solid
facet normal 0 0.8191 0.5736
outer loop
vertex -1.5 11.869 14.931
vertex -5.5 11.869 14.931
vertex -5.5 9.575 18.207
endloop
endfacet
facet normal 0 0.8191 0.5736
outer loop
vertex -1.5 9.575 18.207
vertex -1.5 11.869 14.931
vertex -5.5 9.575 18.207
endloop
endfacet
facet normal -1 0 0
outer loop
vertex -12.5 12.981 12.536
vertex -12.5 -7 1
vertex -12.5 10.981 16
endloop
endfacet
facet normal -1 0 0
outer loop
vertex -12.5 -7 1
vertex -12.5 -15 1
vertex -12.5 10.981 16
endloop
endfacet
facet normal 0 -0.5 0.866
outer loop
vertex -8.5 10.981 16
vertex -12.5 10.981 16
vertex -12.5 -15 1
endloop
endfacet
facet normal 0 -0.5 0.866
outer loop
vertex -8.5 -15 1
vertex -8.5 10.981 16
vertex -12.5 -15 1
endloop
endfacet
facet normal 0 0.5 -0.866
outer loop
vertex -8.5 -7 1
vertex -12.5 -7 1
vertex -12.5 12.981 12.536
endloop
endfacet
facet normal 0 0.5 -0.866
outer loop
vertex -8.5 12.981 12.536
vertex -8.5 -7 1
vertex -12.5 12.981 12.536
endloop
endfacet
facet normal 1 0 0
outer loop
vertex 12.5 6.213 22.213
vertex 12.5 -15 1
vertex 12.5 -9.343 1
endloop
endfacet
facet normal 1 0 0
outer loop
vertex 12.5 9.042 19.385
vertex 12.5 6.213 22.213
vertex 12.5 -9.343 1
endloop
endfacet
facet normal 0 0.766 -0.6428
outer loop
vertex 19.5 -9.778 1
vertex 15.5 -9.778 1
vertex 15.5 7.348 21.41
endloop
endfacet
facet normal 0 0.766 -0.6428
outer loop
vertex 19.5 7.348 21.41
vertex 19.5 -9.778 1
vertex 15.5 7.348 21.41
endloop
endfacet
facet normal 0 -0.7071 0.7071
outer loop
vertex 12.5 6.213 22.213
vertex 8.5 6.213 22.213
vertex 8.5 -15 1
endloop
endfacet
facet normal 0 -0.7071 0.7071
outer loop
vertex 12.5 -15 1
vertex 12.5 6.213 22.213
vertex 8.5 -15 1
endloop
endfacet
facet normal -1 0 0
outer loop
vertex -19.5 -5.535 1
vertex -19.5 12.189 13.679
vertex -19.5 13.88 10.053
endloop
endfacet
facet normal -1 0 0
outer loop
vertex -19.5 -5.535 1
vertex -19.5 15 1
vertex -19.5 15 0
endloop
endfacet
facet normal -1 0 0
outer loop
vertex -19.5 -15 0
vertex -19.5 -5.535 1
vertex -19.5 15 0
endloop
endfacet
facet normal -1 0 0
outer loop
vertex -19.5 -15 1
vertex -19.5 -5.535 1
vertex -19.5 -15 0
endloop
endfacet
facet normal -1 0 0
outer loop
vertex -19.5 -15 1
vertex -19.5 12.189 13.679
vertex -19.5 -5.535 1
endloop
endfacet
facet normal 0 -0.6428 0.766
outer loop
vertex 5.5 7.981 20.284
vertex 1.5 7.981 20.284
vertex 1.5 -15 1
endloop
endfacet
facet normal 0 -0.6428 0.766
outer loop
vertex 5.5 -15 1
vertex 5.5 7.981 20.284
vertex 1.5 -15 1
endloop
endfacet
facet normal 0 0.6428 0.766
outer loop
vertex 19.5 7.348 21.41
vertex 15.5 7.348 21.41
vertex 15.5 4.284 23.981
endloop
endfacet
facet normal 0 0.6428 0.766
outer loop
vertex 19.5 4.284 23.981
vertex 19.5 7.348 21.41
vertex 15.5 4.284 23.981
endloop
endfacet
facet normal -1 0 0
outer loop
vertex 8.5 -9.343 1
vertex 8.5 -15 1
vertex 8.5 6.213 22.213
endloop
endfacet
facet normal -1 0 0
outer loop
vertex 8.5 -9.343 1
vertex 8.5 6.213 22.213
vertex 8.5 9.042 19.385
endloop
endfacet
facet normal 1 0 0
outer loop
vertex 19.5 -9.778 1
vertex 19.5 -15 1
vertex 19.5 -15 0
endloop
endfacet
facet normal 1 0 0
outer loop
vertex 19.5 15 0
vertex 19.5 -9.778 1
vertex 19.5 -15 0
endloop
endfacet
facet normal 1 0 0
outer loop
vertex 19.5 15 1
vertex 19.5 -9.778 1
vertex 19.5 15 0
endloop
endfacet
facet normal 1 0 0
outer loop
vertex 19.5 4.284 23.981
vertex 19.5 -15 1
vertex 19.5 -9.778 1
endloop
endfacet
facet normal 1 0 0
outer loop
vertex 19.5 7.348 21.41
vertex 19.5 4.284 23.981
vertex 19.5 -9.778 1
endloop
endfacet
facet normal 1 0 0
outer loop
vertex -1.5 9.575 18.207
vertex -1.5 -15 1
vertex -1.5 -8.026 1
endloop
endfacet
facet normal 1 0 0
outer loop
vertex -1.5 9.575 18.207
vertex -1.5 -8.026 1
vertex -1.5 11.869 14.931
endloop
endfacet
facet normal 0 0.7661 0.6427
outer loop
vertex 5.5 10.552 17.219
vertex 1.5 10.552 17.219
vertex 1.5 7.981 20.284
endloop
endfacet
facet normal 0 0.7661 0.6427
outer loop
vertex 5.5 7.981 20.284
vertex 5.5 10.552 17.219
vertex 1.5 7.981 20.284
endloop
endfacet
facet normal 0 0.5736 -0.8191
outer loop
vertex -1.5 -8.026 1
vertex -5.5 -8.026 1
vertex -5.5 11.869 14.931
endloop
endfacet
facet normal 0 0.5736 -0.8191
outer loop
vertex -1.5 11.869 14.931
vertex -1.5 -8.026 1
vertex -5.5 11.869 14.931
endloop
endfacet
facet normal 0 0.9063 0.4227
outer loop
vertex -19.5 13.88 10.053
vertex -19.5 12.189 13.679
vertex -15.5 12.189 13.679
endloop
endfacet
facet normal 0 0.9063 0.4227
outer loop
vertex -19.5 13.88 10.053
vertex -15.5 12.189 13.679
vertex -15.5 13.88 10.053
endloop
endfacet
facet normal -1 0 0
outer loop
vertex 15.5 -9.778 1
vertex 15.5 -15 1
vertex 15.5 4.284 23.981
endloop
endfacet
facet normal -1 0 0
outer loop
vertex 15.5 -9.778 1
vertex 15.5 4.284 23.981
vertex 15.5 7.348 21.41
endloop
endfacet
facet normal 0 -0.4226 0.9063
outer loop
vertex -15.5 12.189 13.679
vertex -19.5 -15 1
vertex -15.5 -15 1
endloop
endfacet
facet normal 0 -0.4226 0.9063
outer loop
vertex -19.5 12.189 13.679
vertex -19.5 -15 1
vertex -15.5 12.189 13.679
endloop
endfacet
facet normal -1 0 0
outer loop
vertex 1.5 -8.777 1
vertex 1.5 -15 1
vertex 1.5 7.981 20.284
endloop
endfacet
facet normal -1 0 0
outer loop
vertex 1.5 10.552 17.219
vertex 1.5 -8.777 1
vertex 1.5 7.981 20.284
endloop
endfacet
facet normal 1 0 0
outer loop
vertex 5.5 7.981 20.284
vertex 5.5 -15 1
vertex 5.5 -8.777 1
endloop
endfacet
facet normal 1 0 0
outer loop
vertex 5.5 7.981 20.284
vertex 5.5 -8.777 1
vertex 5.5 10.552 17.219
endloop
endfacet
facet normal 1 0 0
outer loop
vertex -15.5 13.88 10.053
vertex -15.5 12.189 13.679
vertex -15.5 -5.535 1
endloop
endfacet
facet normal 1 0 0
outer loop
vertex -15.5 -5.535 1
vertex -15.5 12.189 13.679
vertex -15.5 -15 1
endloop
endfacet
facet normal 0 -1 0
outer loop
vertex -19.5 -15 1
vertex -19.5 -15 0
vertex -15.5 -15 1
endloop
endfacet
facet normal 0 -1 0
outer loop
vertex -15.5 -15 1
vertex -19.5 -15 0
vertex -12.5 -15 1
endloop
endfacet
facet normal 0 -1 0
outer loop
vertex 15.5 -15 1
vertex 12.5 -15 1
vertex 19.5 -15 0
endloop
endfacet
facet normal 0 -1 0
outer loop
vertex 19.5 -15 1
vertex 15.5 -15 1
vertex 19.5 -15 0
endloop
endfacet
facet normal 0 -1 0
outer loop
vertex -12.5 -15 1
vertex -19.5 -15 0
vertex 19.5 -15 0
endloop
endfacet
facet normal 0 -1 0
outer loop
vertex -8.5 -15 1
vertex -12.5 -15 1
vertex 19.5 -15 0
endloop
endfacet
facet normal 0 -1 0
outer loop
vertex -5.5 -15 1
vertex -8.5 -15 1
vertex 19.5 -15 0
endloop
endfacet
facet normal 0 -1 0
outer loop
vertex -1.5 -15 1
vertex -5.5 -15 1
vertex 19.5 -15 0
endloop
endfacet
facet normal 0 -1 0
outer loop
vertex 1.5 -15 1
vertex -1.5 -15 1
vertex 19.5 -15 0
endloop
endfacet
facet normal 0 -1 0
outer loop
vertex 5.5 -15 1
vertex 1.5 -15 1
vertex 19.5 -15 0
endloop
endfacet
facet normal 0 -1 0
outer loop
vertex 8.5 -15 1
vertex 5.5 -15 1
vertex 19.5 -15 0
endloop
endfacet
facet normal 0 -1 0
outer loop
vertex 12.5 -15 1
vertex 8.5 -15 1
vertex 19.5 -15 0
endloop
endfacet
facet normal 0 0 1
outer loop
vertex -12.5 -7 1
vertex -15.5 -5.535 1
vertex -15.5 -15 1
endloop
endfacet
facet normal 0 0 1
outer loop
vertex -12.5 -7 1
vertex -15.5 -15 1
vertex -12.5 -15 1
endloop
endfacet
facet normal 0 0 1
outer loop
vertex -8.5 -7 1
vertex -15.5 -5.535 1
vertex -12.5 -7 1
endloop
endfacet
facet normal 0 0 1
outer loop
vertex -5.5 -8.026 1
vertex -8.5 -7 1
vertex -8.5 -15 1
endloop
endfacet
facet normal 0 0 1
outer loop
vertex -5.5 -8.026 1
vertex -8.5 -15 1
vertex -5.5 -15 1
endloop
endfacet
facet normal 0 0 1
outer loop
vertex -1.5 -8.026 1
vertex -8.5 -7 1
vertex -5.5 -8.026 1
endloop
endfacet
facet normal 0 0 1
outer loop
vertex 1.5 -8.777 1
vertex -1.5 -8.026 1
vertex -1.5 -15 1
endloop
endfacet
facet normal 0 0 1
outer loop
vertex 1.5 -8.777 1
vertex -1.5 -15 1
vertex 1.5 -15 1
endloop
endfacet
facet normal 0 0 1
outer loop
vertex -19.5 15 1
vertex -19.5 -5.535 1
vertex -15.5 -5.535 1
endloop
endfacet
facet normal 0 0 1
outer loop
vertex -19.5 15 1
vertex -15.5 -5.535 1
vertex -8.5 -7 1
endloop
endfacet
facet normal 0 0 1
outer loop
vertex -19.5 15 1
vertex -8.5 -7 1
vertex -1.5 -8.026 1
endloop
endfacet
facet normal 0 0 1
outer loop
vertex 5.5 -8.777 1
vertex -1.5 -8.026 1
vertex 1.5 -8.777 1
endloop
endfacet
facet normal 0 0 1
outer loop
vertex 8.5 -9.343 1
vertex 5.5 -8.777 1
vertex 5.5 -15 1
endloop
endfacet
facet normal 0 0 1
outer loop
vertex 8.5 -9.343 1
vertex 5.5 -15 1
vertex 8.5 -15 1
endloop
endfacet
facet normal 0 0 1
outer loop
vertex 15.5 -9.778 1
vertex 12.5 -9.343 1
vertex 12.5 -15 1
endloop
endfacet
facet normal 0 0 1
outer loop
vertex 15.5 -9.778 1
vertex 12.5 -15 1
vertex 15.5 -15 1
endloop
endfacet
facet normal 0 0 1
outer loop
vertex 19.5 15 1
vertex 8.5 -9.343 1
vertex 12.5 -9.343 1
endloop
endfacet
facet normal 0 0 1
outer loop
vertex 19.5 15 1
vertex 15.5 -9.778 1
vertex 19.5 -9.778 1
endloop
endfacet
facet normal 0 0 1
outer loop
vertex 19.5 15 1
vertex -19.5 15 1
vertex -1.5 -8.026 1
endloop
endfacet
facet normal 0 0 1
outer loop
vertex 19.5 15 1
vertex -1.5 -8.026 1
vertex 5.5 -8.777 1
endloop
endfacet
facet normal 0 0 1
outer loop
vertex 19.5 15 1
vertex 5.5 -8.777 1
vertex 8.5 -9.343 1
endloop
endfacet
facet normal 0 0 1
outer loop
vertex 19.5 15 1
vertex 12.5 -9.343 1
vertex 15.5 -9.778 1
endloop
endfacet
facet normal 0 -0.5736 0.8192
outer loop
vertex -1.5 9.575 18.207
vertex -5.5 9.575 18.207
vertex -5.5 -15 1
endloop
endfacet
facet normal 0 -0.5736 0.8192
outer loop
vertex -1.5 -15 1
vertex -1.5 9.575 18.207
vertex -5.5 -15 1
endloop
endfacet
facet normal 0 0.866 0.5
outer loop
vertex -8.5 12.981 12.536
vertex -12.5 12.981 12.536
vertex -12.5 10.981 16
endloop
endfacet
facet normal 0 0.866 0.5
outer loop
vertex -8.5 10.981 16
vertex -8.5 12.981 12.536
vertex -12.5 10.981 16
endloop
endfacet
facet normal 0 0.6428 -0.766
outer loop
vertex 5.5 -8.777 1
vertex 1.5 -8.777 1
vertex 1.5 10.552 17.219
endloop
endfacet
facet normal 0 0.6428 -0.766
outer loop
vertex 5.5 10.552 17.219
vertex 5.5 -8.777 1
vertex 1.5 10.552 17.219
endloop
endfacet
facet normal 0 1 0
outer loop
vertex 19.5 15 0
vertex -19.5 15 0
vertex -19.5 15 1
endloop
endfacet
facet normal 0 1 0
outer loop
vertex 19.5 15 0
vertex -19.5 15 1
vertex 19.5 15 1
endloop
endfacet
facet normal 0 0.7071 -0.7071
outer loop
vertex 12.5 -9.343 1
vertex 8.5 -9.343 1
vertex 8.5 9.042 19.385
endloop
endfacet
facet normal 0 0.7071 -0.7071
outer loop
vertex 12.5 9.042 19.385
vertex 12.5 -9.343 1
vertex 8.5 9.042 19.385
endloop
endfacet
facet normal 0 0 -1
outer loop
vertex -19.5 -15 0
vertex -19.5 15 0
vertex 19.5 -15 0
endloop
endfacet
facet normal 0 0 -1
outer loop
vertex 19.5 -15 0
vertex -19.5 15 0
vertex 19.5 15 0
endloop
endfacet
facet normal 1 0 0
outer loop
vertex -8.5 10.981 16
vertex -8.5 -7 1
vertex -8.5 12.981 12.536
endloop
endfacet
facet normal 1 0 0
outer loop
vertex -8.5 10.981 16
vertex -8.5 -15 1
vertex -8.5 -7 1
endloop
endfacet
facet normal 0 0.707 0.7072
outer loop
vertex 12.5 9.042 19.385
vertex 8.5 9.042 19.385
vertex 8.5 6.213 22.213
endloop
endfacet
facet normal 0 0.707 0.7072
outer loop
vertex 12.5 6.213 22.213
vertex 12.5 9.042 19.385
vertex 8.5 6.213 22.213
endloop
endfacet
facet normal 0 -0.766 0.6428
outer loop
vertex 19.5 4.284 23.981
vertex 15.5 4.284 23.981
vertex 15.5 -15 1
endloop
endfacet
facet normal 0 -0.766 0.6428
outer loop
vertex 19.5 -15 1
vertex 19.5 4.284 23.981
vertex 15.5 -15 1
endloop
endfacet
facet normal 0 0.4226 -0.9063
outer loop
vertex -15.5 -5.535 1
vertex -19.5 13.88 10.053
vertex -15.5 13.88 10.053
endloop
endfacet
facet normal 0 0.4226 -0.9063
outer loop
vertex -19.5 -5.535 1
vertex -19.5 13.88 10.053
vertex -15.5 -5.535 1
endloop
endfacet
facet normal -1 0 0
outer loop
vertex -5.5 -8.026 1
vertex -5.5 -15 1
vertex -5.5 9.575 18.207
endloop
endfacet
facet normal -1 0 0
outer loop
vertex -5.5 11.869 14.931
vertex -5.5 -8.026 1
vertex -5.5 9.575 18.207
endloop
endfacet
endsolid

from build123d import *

# Parameters (mm, degrees)
F2_W      = 39
F2_H      = 30
F3_DEPTH  = 1
F5_DEPTH  = 4
F8_DEPTH  = 4
F11_DEPTH = 4
F14_DEPTH = 4
F17_DEPTH = 4
F20_DEPTH = 4


with BuildPart() as f3:
    # F2 (on Top) → F3 (new body)
    with BuildSketch(Plane.XY):
        Rectangle(F2_W, F2_H)
    extrude(amount=F3_DEPTH)

    # F4 (on face) → F5 (join)
    with BuildSketch(Plane(origin=(-19.5, 0, 0), x_dir=(0, -1, 0), z_dir=(-1, 0, 0))):
        Polygon((5.5351936674, 1), (15, 1), (-12.1892336111, 13.6785478522), (-13.8797066581, 10.0533167041), align=None)
    extrude(amount=-F5_DEPTH)

    # F7 (on offset) → F8 (join)
    with BuildSketch(Plane.YZ.offset(-12.5)):
        Polygon((-15, 1), (-7, 1), (12.9807621135, 12.5358983849), (10.9807621135, 16), align=None)
    extrude(amount=F8_DEPTH)

    # F10 (on offset) → F11 (join)
    with BuildSketch(Plane.YZ.offset(-5.5)):
        Polygon((9.5745613287, 18.2072930905), (-15, 1), (-8.0262128175, 1), (11.8688670741, 14.9306849134), align=None)
    extrude(amount=F11_DEPTH)

    # F13 (on offset) → F14 (join)
    with BuildSketch(Plane.YZ.offset(1.5)):
        Polygon((7.9813332936, 20.2836282906), (-15, 1), (-8.7771046926, 1), (10.5524837323, 17.2194505181), align=None)
    extrude(amount=F14_DEPTH)

    # F16 (on offset) → F17 (join)
    with BuildSketch(Plane.YZ.offset(8.5)):
        Polygon((6.2132034356, 22.2132034356), (-15, 1), (-9.3431457505, 1), (9.0416305603, 19.3847763109), align=None)
    extrude(amount=F17_DEPTH)

    # F19 (on offset) → F20 (join)
    with BuildSketch(Plane.YZ.offset(15.5)):
        Polygon((4.2836282906, 23.9813332936), (-15, 1), (-9.7783708427, 1), (7.3478060631, 21.4101828548), align=None)
    extrude(amount=F20_DEPTH)


solid = f3.part
